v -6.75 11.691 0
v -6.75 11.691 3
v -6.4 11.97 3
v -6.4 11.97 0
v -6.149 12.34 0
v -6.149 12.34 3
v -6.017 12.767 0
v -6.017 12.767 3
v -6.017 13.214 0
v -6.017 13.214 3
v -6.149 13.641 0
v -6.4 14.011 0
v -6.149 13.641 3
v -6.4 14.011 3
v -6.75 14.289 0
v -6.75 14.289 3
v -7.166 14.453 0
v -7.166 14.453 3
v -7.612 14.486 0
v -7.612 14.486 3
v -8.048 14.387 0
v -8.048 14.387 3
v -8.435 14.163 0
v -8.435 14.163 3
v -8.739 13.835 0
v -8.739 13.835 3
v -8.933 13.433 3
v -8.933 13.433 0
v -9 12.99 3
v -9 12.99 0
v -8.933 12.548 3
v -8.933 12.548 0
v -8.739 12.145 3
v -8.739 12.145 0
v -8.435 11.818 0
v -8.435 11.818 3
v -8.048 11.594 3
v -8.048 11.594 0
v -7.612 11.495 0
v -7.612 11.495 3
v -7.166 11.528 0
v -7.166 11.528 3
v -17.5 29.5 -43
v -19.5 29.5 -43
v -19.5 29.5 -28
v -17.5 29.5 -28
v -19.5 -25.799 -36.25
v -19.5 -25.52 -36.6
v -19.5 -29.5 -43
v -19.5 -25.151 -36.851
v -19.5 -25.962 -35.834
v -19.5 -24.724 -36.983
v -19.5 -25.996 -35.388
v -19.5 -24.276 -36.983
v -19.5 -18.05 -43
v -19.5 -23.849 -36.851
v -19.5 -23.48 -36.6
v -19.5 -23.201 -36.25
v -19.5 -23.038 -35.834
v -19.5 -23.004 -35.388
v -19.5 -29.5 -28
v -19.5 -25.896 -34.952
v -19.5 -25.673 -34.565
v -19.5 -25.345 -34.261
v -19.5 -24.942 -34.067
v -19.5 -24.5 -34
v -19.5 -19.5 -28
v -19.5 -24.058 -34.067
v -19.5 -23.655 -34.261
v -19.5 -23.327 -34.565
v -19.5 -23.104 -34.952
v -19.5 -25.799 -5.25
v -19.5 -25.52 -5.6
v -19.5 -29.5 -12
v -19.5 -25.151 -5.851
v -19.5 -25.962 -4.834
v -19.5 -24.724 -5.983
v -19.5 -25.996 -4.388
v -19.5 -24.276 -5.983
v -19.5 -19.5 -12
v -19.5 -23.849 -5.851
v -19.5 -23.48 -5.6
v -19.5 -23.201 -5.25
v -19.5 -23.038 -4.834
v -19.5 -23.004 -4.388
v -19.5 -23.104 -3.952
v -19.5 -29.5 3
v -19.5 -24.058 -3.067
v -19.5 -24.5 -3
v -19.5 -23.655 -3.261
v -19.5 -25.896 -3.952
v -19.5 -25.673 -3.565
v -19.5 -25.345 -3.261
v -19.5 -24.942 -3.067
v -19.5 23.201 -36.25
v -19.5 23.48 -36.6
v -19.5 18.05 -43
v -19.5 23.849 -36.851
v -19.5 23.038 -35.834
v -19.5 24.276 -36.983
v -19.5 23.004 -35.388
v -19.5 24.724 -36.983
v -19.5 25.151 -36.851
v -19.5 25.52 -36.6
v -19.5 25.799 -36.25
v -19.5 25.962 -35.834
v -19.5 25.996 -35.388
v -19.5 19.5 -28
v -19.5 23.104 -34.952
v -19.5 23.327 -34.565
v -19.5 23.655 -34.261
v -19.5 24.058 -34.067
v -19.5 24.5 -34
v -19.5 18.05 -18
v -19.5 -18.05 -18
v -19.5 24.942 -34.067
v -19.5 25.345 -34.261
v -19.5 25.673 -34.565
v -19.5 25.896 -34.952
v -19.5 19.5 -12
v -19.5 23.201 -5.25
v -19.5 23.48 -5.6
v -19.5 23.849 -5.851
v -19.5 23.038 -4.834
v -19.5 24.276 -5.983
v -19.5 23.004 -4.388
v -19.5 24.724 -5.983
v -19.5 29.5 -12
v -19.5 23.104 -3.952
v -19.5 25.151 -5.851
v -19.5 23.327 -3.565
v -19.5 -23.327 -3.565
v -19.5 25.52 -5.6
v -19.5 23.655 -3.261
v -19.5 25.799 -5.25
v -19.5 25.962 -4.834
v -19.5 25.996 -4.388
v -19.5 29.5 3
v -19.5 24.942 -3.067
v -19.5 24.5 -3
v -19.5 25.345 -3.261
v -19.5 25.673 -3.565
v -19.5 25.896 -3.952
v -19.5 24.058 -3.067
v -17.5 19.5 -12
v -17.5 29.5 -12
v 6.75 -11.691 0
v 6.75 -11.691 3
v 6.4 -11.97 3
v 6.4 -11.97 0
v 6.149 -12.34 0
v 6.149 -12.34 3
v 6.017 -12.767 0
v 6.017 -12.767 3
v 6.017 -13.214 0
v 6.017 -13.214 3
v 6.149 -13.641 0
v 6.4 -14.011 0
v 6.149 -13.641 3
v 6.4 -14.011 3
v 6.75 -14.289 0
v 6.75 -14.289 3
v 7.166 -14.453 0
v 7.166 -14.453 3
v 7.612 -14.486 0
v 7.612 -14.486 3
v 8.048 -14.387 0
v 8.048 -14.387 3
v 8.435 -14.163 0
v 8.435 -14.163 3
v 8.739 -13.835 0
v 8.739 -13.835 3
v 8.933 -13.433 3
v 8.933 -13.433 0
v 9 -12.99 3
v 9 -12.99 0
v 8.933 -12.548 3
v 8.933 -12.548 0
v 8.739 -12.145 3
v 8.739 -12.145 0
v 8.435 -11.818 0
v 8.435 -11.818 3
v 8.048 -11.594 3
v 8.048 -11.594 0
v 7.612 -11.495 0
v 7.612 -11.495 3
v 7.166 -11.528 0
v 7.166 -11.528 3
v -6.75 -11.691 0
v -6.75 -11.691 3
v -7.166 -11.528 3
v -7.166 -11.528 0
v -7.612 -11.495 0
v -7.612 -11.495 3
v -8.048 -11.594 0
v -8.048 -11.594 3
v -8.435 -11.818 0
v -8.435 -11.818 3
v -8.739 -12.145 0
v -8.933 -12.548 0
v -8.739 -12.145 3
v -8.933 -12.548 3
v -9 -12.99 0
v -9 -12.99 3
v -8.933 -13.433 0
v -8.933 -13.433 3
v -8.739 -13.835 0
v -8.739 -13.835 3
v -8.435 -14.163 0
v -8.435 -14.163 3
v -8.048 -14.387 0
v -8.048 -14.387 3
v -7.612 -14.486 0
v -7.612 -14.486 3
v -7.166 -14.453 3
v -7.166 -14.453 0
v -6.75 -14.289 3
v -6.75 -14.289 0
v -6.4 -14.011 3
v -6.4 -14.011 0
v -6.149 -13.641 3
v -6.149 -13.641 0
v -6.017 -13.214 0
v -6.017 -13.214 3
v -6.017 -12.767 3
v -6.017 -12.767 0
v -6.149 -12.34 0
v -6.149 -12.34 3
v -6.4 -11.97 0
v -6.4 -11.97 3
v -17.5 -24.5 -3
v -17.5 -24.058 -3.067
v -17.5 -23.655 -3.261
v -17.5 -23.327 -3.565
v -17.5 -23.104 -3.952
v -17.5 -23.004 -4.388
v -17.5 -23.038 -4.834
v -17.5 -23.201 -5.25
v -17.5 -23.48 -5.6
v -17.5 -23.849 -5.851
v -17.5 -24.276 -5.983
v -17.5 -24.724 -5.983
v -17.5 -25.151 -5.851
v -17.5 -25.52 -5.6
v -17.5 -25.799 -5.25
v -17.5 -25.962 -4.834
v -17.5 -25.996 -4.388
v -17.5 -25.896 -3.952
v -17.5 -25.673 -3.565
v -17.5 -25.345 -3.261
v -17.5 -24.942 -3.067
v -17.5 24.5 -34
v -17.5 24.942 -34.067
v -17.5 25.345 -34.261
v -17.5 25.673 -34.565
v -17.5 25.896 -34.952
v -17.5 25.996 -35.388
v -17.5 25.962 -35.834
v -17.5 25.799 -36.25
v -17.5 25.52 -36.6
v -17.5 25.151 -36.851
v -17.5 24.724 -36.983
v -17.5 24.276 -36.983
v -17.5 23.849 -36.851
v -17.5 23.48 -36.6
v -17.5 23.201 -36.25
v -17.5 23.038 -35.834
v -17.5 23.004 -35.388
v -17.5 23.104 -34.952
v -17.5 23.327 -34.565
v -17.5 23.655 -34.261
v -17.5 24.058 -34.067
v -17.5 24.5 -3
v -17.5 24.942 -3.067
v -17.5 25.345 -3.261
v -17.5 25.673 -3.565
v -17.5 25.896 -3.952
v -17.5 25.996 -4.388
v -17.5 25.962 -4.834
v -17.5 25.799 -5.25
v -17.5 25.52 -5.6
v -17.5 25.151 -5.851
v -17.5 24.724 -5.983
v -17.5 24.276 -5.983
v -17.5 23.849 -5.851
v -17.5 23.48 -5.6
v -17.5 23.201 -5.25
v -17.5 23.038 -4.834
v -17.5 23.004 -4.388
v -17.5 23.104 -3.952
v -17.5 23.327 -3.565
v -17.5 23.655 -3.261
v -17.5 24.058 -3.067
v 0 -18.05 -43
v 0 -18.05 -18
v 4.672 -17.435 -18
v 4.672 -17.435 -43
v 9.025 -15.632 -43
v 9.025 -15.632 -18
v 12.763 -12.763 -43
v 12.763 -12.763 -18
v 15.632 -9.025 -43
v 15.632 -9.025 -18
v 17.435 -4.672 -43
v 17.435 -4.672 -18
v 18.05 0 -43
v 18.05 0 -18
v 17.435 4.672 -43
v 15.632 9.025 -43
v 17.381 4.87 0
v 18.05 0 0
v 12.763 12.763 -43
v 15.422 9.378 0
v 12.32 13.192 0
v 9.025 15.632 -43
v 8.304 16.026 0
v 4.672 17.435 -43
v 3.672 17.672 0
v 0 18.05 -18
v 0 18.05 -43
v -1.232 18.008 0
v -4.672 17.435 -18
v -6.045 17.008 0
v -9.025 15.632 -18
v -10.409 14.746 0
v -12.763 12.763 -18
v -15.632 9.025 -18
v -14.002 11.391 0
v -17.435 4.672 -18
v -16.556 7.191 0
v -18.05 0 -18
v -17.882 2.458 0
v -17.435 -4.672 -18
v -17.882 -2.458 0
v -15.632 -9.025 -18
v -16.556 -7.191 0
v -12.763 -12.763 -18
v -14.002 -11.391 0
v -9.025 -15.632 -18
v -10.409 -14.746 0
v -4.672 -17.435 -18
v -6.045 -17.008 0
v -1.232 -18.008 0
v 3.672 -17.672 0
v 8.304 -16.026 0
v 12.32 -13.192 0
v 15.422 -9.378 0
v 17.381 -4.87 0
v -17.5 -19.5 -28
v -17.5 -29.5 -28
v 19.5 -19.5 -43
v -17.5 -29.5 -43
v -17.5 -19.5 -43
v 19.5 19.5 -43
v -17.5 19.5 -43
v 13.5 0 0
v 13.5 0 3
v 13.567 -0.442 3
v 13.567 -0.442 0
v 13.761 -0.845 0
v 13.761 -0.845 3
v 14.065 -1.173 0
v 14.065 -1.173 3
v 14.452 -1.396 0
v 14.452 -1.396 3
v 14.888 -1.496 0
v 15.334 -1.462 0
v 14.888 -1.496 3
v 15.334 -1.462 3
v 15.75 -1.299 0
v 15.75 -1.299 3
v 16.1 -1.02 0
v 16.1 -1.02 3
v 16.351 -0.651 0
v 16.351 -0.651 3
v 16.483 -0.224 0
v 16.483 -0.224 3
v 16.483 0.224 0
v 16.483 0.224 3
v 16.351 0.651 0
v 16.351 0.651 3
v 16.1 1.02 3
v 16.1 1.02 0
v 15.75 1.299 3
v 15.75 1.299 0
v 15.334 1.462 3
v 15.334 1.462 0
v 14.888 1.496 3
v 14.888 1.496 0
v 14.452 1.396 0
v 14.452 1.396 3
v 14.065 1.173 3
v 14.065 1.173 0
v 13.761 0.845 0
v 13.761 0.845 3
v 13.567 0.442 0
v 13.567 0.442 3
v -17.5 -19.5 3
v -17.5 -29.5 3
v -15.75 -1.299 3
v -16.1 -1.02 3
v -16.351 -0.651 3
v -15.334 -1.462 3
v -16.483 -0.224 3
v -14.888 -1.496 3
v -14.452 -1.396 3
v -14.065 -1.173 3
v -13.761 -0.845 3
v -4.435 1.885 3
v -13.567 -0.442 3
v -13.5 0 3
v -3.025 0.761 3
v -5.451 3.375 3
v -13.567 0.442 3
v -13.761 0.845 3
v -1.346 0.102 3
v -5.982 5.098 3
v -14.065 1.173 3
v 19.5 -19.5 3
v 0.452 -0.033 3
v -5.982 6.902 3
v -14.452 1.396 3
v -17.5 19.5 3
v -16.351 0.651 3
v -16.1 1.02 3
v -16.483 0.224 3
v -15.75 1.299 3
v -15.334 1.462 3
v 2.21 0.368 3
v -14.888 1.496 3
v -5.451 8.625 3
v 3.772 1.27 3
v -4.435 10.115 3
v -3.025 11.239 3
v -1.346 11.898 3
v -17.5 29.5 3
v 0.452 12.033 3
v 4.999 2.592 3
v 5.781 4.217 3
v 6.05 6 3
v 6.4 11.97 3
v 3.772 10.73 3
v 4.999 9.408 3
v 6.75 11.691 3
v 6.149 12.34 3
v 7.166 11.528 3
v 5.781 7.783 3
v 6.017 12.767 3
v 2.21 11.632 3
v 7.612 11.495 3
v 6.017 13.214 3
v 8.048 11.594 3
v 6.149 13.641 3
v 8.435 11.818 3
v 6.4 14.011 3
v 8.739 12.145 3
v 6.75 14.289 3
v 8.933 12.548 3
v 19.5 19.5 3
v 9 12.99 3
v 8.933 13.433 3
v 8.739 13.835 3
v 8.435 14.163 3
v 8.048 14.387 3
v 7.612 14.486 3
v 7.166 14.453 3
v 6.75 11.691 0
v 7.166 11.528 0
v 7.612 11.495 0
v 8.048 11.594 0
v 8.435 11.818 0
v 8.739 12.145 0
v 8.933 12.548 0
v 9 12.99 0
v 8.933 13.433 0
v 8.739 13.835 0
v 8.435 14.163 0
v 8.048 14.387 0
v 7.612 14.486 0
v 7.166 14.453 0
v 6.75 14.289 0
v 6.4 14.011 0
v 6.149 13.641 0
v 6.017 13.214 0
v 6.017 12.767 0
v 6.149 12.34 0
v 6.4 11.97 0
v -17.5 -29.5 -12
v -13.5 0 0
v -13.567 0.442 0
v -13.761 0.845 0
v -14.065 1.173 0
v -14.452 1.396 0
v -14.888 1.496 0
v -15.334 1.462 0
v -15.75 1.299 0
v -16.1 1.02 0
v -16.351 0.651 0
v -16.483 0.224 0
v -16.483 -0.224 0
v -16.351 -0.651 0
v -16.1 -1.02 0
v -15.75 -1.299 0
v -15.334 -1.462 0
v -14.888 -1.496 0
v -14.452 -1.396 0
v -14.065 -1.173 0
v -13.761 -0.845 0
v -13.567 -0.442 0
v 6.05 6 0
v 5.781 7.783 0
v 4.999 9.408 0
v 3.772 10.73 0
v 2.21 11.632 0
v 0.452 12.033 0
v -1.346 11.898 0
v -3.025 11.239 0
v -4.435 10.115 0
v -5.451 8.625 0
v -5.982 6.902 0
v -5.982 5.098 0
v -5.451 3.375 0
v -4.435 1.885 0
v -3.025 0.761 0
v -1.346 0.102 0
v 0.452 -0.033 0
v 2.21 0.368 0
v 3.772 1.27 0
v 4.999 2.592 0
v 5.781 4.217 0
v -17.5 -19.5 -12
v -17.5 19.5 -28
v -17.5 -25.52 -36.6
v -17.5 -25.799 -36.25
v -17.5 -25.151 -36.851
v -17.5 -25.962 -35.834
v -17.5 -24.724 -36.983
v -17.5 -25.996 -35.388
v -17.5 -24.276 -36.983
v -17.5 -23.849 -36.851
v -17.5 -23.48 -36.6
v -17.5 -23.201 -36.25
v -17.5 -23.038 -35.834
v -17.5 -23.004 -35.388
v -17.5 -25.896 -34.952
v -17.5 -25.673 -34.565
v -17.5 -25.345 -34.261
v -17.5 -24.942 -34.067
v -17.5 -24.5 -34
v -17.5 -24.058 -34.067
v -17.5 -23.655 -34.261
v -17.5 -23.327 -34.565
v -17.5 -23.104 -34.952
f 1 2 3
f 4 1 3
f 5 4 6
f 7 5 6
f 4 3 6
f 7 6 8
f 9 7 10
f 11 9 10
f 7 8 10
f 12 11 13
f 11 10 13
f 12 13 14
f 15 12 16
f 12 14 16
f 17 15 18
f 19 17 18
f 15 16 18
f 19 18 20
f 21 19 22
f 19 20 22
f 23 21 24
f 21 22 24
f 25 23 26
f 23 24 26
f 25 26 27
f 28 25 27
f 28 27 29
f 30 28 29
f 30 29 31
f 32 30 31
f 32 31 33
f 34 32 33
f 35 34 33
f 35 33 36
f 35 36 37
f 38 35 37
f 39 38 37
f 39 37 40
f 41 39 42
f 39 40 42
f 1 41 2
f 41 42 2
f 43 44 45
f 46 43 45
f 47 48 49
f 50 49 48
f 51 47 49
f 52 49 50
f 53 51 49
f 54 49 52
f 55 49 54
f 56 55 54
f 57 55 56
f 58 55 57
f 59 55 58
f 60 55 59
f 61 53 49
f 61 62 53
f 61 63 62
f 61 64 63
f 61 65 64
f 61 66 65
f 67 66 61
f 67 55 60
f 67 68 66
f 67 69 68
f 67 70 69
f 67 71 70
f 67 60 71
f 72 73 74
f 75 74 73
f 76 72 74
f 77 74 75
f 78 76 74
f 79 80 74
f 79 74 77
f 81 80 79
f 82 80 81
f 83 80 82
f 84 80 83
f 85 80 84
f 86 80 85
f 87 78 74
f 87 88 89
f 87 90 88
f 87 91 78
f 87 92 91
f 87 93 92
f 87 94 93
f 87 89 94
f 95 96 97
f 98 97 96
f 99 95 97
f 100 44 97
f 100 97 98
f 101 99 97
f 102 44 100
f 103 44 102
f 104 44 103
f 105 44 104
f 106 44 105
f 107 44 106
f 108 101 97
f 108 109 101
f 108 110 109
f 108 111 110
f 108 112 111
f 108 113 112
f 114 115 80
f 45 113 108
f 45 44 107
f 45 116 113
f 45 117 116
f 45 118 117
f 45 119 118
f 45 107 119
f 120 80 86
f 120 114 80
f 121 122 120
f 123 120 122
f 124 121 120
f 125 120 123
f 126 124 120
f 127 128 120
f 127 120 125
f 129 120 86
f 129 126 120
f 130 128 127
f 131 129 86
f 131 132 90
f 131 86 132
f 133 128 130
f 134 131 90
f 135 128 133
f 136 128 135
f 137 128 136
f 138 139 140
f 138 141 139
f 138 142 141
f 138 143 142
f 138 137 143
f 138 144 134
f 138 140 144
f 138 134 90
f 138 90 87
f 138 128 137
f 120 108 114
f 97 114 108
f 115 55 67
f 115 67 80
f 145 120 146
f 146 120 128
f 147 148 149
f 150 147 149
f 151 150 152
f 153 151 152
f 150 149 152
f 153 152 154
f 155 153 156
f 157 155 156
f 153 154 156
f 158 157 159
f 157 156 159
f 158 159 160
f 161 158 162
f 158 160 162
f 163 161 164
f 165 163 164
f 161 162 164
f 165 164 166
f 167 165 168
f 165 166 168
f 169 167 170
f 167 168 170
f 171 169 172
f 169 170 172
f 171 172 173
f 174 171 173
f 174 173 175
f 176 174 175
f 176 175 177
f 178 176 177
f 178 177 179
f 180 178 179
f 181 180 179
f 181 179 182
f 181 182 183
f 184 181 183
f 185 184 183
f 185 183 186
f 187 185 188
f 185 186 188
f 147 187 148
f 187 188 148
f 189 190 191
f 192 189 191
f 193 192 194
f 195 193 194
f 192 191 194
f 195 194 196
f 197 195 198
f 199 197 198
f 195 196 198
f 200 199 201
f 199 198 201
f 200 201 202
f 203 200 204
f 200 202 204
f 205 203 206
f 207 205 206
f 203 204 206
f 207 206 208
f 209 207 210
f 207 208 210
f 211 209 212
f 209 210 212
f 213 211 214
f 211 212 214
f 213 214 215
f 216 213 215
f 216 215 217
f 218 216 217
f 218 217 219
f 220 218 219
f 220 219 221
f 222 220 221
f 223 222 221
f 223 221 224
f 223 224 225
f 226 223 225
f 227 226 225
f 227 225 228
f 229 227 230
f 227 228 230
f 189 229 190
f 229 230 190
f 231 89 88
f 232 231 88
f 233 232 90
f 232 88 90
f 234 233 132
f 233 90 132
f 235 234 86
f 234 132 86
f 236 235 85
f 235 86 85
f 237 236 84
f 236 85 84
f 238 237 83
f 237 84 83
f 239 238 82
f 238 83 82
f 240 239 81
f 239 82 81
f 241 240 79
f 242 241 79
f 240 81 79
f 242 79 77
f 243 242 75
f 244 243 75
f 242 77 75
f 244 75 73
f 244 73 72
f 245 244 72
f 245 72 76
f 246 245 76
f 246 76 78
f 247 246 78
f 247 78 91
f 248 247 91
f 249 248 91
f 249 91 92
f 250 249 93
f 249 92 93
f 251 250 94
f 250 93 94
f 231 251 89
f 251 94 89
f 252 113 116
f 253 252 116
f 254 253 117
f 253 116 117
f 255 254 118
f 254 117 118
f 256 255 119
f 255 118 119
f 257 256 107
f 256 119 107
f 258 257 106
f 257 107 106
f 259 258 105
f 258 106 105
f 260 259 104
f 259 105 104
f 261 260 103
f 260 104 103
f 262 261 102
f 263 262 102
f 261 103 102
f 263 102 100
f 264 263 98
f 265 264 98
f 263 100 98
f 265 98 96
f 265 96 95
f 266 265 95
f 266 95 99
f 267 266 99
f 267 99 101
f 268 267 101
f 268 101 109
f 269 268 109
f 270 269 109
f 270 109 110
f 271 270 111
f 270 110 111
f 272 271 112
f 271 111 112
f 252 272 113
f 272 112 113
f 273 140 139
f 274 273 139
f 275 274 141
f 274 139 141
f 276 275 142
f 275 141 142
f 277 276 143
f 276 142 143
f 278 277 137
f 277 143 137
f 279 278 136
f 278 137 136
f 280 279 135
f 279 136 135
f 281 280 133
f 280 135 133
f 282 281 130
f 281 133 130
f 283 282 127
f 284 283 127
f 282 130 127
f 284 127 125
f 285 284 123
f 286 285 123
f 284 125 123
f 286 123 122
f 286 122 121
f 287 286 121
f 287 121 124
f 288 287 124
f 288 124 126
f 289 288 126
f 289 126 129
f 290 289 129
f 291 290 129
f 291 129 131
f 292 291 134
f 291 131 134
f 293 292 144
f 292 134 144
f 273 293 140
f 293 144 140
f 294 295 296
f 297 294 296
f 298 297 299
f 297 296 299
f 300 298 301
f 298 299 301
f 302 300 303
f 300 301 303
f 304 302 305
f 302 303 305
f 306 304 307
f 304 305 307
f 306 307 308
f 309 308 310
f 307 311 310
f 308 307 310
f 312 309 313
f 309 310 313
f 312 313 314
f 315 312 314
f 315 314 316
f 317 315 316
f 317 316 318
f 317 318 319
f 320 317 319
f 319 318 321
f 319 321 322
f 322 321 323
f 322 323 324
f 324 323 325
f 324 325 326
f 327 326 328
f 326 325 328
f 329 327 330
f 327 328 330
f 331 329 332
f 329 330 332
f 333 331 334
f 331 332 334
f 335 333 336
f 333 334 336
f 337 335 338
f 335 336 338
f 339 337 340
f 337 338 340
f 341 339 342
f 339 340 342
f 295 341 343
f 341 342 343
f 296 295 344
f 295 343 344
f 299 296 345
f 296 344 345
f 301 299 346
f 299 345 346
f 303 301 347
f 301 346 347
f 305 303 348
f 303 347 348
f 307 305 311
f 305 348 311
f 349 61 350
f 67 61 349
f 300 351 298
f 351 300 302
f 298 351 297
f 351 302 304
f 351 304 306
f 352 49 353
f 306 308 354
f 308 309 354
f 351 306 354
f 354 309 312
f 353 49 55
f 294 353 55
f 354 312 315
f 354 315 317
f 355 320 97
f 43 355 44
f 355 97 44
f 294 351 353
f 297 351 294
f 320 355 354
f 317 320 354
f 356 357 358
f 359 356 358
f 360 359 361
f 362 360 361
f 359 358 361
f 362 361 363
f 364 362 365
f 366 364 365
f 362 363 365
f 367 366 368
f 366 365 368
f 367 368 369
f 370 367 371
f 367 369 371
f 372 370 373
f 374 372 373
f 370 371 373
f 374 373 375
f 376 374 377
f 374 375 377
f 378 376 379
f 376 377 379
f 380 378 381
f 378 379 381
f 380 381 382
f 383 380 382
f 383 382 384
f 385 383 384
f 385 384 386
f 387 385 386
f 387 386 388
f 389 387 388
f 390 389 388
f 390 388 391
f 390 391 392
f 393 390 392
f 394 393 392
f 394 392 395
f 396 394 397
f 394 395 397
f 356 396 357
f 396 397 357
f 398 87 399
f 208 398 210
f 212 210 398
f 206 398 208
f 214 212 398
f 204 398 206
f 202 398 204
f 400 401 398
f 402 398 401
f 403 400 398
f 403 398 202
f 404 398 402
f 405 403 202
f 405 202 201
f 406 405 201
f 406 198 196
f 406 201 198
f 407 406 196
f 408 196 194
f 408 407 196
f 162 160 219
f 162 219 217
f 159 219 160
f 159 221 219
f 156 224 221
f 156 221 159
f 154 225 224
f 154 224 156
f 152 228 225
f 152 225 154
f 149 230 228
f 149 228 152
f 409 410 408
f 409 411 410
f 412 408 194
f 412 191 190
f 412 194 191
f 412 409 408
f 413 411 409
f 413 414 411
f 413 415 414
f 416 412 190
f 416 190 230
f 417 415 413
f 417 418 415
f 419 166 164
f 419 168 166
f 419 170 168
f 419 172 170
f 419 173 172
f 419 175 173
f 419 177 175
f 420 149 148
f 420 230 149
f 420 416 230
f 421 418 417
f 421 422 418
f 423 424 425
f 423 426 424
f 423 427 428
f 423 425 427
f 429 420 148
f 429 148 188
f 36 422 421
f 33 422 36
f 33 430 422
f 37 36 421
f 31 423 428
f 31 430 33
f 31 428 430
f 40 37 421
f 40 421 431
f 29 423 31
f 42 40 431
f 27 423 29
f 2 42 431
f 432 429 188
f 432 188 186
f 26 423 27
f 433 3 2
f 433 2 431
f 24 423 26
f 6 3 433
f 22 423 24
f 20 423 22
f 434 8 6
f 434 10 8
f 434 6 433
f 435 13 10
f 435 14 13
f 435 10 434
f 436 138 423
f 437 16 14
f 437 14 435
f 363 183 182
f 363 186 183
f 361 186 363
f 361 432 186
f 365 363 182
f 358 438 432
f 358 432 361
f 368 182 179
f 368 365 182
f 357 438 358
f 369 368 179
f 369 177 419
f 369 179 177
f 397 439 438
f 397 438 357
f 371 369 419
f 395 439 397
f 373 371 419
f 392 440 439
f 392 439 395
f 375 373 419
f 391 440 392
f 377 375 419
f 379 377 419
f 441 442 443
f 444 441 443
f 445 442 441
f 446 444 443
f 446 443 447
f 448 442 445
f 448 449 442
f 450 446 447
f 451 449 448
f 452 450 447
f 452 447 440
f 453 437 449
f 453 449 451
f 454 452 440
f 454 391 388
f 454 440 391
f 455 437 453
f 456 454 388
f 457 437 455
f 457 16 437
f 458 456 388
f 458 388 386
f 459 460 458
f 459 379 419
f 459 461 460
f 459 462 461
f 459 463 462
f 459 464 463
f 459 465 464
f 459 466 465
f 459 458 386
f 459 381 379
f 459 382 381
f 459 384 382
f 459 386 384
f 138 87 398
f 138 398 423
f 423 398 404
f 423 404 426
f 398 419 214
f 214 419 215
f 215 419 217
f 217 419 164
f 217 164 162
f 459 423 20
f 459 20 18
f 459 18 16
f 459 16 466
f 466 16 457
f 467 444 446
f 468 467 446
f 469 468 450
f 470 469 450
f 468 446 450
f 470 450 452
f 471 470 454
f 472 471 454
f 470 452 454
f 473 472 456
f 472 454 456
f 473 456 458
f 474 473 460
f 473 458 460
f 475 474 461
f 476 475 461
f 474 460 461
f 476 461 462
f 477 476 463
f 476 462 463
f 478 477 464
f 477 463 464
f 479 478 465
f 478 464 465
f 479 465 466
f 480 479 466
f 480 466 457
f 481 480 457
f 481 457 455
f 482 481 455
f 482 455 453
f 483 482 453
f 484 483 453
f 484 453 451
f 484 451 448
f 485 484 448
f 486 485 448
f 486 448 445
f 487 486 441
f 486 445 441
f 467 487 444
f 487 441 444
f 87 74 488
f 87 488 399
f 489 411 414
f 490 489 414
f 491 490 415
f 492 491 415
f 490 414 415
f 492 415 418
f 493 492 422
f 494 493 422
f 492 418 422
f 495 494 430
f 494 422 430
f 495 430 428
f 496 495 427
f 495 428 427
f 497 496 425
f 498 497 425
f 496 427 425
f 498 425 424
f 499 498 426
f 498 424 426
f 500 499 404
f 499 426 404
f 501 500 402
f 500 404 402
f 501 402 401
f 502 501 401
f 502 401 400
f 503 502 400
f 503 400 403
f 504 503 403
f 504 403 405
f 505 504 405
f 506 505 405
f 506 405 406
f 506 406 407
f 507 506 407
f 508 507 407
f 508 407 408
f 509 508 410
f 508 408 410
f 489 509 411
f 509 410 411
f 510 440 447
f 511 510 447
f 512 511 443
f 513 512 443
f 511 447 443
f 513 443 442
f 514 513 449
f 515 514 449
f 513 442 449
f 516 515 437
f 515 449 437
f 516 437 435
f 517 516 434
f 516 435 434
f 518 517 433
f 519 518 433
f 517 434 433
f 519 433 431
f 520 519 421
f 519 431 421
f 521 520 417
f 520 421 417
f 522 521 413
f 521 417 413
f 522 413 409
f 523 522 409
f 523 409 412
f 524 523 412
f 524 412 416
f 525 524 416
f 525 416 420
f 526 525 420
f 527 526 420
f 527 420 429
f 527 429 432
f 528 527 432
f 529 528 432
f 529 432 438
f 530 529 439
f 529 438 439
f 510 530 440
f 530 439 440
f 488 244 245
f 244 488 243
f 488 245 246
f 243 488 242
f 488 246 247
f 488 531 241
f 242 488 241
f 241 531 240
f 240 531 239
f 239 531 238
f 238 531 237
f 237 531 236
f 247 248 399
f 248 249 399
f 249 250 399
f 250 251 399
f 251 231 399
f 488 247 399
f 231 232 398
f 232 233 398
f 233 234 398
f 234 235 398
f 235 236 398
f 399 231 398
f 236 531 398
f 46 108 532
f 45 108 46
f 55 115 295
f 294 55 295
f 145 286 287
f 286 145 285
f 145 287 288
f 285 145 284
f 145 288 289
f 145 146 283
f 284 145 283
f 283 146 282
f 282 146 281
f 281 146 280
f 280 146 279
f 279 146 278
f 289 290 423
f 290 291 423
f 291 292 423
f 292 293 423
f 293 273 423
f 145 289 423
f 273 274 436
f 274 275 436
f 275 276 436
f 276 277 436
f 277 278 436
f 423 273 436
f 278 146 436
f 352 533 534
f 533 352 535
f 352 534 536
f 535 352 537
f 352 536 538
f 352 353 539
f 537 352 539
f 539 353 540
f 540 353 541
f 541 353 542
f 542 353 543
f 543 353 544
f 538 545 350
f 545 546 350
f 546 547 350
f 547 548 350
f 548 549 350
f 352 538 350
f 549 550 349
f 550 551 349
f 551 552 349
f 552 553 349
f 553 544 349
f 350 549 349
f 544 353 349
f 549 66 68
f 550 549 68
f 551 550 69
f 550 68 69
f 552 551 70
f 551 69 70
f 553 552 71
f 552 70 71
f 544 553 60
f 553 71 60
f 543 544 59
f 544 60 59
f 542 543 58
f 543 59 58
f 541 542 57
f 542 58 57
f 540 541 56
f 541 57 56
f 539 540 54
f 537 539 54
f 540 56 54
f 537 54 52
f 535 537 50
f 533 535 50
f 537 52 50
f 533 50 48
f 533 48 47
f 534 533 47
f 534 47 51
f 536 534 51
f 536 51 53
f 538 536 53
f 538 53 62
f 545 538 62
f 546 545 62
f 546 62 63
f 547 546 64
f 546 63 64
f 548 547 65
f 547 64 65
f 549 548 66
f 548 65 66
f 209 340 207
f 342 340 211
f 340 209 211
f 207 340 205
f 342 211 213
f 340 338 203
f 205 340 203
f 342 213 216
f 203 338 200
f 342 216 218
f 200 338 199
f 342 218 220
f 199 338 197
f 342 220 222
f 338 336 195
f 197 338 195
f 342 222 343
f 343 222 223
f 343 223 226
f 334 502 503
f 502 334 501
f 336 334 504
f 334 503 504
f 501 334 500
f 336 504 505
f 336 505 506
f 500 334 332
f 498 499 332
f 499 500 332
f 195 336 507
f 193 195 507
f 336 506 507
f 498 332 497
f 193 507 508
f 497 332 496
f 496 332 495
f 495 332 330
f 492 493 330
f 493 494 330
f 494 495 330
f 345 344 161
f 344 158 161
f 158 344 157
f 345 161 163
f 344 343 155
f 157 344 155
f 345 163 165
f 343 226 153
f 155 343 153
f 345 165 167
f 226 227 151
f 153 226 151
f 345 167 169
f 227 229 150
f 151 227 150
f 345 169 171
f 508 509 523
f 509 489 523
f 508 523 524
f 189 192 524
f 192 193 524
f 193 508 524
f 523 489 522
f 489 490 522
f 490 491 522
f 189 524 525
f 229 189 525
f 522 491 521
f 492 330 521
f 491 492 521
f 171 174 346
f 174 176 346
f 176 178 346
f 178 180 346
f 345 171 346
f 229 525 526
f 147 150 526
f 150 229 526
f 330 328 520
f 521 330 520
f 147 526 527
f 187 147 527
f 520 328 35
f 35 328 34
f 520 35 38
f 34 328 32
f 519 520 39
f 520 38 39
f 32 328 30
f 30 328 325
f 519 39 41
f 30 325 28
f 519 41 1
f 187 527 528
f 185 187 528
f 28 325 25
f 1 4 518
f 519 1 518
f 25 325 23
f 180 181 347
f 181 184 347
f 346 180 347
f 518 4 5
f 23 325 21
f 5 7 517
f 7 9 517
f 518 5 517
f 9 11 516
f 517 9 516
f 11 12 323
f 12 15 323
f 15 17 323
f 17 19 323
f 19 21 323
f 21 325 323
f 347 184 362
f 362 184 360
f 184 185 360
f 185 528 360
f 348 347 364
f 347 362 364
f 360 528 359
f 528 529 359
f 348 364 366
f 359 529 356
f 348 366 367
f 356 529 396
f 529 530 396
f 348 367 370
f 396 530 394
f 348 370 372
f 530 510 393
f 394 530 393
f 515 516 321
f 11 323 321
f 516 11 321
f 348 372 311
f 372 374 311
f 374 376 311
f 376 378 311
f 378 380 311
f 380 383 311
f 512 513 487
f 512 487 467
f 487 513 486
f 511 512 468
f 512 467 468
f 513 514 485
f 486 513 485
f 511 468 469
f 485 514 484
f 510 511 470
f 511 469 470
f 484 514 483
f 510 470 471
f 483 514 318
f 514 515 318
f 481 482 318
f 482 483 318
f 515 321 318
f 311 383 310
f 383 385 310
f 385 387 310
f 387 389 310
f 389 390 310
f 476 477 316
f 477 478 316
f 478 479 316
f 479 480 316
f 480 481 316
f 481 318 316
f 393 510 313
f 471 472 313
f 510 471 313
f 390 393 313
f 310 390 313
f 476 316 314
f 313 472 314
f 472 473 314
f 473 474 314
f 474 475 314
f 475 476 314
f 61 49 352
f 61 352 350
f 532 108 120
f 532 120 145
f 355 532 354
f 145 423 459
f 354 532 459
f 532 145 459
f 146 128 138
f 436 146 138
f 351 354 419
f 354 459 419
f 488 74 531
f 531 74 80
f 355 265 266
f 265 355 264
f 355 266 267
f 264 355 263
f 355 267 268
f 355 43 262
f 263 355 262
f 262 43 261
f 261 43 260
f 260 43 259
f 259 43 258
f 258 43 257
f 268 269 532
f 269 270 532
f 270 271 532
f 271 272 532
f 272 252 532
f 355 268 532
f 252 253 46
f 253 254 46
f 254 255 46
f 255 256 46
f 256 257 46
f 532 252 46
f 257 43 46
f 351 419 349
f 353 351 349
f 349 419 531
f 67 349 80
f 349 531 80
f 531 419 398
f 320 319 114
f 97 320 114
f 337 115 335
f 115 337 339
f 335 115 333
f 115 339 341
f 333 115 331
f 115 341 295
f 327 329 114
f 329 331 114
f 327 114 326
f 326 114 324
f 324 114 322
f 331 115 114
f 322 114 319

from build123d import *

# Parameters (mm, degrees)
SKETCH1_R           = 18.05
BOSS_EXTRUDE1_DEPTH = 3
SKETCH2_R           = 1.5
CUT_EXTRUDE1_DEPTH  = 3
CIRPATTERN1_COUNT   = 6
SKETCH3_R           = 6.05
CUT_EXTRUDE2_DEPTH  = 3
SKETCH4_W           = 39
SKETCH4_H           = 39
SKETCH4_R           = 18.05
BOSS_EXTRUDE2_DEPTH = 21
BOSS_EXTRUDE3_DEPTH = 25
SKETCH6_W           = 15
SKETCH6_H           = 10
SKETCH6_R           = 1.5
BOSS_EXTRUDE4_DEPTH = 2
SKETCH7_W           = 15
SKETCH7_H           = 10
SKETCH7_R           = 1.5
BOSS_EXTRUDE5_DEPTH = 2


with BuildPart() as part:
    # Sketch1 → Boss-Extrude1 (new body)
    with BuildSketch(Plane.XY):
        Circle(SKETCH1_R)
    extrude(amount=BOSS_EXTRUDE1_DEPTH)

    # Sketch2 → Cut-Extrude1 (cut)
    with BuildSketch(Plane.XY.offset(3)):
        with Locations((-15, 0)):
            Circle(SKETCH2_R)
    cut_extrude1 = extrude(amount=-CUT_EXTRUDE1_DEPTH, mode=Mode.SUBTRACT)

    # CirPattern1: Cut-Extrude1 ×6 about axis
    cirpattern1_axis = Axis((0, 0, 0), (0, 0, 1))
    for i in range(1, CIRPATTERN1_COUNT):
        add(cut_extrude1.rotate(cirpattern1_axis, i * 360 / CIRPATTERN1_COUNT), mode=Mode.SUBTRACT)

    # Sketch3 → Cut-Extrude2 (cut)
    with BuildSketch(Plane.XY.offset(3)):
        with Locations((0, 6)):
            Circle(SKETCH3_R)
    extrude(amount=-CUT_EXTRUDE2_DEPTH, mode=Mode.SUBTRACT)

    # Sketch4 → Boss-Extrude2 (add)
    with BuildSketch(Plane.XY.offset(3)):
        Rectangle(SKETCH4_W, SKETCH4_H)
        Circle(SKETCH4_R, mode=Mode.SUBTRACT)
    extrude(amount=-BOSS_EXTRUDE2_DEPTH)

    # Sketch5 → Boss-Extrude3 (add)
    with BuildSketch(Plane(origin=(0, 0, -18), x_dir=(-1, 0, 0), z_dir=(0, 0, -1))):
        with BuildLine():
            Line((0, 18.05), (19.5, 18.05))
            Line((19.5, 18.05), (19.5, 19.5))
            Line((19.5, 19.5), (-19.5, 19.5))
            Line((-19.5, 19.5), (-19.5, -19.5))
            Line((-19.5, -19.5), (19.5, -19.5))
            Line((19.5, -19.5), (19.5, -18.05))
            Line((19.5, -18.05), (0, -18.05))
            ThreePointArc((0, -18.05), (-18.05, 0), (0, 18.05))
        make_face()
    extrude(amount=BOSS_EXTRUDE3_DEPTH)

    # Sketch6 → Boss-Extrude4 (add)
    with BuildSketch(Plane.ZY.offset(19.5)):
        with Locations((-35.5, 24.5)):
            Rectangle(SKETCH6_W, SKETCH6_H)
        with Locations((-35.5, 24.5)):
            Circle(SKETCH6_R, mode=Mode.SUBTRACT)
        with Locations((-35.5, -24.5)):
            Rectangle(SKETCH6_W, SKETCH6_H)
        with Locations((-35.5, -24.5)):
            Circle(SKETCH6_R, mode=Mode.SUBTRACT)
    extrude(amount=-BOSS_EXTRUDE4_DEPTH)

    # Sketch7 → Boss-Extrude5 (add)
    with BuildSketch(Plane.ZY.offset(19.5)):
        with Locations((-4.5, 24.5)):
            Rectangle(SKETCH7_W, SKETCH7_H)
        with Locations((-4.5, 24.5)):
            Circle(SKETCH7_R, mode=Mode.SUBTRACT)
        with Locations((-4.5, -24.5)):
            Rectangle(SKETCH7_W, SKETCH7_H)
        with Locations((-4.5, -24.5)):
            Circle(SKETCH7_R, mode=Mode.SUBTRACT)
    extrude(amount=-BOSS_EXTRUDE5_DEPTH)


solid = part.part
